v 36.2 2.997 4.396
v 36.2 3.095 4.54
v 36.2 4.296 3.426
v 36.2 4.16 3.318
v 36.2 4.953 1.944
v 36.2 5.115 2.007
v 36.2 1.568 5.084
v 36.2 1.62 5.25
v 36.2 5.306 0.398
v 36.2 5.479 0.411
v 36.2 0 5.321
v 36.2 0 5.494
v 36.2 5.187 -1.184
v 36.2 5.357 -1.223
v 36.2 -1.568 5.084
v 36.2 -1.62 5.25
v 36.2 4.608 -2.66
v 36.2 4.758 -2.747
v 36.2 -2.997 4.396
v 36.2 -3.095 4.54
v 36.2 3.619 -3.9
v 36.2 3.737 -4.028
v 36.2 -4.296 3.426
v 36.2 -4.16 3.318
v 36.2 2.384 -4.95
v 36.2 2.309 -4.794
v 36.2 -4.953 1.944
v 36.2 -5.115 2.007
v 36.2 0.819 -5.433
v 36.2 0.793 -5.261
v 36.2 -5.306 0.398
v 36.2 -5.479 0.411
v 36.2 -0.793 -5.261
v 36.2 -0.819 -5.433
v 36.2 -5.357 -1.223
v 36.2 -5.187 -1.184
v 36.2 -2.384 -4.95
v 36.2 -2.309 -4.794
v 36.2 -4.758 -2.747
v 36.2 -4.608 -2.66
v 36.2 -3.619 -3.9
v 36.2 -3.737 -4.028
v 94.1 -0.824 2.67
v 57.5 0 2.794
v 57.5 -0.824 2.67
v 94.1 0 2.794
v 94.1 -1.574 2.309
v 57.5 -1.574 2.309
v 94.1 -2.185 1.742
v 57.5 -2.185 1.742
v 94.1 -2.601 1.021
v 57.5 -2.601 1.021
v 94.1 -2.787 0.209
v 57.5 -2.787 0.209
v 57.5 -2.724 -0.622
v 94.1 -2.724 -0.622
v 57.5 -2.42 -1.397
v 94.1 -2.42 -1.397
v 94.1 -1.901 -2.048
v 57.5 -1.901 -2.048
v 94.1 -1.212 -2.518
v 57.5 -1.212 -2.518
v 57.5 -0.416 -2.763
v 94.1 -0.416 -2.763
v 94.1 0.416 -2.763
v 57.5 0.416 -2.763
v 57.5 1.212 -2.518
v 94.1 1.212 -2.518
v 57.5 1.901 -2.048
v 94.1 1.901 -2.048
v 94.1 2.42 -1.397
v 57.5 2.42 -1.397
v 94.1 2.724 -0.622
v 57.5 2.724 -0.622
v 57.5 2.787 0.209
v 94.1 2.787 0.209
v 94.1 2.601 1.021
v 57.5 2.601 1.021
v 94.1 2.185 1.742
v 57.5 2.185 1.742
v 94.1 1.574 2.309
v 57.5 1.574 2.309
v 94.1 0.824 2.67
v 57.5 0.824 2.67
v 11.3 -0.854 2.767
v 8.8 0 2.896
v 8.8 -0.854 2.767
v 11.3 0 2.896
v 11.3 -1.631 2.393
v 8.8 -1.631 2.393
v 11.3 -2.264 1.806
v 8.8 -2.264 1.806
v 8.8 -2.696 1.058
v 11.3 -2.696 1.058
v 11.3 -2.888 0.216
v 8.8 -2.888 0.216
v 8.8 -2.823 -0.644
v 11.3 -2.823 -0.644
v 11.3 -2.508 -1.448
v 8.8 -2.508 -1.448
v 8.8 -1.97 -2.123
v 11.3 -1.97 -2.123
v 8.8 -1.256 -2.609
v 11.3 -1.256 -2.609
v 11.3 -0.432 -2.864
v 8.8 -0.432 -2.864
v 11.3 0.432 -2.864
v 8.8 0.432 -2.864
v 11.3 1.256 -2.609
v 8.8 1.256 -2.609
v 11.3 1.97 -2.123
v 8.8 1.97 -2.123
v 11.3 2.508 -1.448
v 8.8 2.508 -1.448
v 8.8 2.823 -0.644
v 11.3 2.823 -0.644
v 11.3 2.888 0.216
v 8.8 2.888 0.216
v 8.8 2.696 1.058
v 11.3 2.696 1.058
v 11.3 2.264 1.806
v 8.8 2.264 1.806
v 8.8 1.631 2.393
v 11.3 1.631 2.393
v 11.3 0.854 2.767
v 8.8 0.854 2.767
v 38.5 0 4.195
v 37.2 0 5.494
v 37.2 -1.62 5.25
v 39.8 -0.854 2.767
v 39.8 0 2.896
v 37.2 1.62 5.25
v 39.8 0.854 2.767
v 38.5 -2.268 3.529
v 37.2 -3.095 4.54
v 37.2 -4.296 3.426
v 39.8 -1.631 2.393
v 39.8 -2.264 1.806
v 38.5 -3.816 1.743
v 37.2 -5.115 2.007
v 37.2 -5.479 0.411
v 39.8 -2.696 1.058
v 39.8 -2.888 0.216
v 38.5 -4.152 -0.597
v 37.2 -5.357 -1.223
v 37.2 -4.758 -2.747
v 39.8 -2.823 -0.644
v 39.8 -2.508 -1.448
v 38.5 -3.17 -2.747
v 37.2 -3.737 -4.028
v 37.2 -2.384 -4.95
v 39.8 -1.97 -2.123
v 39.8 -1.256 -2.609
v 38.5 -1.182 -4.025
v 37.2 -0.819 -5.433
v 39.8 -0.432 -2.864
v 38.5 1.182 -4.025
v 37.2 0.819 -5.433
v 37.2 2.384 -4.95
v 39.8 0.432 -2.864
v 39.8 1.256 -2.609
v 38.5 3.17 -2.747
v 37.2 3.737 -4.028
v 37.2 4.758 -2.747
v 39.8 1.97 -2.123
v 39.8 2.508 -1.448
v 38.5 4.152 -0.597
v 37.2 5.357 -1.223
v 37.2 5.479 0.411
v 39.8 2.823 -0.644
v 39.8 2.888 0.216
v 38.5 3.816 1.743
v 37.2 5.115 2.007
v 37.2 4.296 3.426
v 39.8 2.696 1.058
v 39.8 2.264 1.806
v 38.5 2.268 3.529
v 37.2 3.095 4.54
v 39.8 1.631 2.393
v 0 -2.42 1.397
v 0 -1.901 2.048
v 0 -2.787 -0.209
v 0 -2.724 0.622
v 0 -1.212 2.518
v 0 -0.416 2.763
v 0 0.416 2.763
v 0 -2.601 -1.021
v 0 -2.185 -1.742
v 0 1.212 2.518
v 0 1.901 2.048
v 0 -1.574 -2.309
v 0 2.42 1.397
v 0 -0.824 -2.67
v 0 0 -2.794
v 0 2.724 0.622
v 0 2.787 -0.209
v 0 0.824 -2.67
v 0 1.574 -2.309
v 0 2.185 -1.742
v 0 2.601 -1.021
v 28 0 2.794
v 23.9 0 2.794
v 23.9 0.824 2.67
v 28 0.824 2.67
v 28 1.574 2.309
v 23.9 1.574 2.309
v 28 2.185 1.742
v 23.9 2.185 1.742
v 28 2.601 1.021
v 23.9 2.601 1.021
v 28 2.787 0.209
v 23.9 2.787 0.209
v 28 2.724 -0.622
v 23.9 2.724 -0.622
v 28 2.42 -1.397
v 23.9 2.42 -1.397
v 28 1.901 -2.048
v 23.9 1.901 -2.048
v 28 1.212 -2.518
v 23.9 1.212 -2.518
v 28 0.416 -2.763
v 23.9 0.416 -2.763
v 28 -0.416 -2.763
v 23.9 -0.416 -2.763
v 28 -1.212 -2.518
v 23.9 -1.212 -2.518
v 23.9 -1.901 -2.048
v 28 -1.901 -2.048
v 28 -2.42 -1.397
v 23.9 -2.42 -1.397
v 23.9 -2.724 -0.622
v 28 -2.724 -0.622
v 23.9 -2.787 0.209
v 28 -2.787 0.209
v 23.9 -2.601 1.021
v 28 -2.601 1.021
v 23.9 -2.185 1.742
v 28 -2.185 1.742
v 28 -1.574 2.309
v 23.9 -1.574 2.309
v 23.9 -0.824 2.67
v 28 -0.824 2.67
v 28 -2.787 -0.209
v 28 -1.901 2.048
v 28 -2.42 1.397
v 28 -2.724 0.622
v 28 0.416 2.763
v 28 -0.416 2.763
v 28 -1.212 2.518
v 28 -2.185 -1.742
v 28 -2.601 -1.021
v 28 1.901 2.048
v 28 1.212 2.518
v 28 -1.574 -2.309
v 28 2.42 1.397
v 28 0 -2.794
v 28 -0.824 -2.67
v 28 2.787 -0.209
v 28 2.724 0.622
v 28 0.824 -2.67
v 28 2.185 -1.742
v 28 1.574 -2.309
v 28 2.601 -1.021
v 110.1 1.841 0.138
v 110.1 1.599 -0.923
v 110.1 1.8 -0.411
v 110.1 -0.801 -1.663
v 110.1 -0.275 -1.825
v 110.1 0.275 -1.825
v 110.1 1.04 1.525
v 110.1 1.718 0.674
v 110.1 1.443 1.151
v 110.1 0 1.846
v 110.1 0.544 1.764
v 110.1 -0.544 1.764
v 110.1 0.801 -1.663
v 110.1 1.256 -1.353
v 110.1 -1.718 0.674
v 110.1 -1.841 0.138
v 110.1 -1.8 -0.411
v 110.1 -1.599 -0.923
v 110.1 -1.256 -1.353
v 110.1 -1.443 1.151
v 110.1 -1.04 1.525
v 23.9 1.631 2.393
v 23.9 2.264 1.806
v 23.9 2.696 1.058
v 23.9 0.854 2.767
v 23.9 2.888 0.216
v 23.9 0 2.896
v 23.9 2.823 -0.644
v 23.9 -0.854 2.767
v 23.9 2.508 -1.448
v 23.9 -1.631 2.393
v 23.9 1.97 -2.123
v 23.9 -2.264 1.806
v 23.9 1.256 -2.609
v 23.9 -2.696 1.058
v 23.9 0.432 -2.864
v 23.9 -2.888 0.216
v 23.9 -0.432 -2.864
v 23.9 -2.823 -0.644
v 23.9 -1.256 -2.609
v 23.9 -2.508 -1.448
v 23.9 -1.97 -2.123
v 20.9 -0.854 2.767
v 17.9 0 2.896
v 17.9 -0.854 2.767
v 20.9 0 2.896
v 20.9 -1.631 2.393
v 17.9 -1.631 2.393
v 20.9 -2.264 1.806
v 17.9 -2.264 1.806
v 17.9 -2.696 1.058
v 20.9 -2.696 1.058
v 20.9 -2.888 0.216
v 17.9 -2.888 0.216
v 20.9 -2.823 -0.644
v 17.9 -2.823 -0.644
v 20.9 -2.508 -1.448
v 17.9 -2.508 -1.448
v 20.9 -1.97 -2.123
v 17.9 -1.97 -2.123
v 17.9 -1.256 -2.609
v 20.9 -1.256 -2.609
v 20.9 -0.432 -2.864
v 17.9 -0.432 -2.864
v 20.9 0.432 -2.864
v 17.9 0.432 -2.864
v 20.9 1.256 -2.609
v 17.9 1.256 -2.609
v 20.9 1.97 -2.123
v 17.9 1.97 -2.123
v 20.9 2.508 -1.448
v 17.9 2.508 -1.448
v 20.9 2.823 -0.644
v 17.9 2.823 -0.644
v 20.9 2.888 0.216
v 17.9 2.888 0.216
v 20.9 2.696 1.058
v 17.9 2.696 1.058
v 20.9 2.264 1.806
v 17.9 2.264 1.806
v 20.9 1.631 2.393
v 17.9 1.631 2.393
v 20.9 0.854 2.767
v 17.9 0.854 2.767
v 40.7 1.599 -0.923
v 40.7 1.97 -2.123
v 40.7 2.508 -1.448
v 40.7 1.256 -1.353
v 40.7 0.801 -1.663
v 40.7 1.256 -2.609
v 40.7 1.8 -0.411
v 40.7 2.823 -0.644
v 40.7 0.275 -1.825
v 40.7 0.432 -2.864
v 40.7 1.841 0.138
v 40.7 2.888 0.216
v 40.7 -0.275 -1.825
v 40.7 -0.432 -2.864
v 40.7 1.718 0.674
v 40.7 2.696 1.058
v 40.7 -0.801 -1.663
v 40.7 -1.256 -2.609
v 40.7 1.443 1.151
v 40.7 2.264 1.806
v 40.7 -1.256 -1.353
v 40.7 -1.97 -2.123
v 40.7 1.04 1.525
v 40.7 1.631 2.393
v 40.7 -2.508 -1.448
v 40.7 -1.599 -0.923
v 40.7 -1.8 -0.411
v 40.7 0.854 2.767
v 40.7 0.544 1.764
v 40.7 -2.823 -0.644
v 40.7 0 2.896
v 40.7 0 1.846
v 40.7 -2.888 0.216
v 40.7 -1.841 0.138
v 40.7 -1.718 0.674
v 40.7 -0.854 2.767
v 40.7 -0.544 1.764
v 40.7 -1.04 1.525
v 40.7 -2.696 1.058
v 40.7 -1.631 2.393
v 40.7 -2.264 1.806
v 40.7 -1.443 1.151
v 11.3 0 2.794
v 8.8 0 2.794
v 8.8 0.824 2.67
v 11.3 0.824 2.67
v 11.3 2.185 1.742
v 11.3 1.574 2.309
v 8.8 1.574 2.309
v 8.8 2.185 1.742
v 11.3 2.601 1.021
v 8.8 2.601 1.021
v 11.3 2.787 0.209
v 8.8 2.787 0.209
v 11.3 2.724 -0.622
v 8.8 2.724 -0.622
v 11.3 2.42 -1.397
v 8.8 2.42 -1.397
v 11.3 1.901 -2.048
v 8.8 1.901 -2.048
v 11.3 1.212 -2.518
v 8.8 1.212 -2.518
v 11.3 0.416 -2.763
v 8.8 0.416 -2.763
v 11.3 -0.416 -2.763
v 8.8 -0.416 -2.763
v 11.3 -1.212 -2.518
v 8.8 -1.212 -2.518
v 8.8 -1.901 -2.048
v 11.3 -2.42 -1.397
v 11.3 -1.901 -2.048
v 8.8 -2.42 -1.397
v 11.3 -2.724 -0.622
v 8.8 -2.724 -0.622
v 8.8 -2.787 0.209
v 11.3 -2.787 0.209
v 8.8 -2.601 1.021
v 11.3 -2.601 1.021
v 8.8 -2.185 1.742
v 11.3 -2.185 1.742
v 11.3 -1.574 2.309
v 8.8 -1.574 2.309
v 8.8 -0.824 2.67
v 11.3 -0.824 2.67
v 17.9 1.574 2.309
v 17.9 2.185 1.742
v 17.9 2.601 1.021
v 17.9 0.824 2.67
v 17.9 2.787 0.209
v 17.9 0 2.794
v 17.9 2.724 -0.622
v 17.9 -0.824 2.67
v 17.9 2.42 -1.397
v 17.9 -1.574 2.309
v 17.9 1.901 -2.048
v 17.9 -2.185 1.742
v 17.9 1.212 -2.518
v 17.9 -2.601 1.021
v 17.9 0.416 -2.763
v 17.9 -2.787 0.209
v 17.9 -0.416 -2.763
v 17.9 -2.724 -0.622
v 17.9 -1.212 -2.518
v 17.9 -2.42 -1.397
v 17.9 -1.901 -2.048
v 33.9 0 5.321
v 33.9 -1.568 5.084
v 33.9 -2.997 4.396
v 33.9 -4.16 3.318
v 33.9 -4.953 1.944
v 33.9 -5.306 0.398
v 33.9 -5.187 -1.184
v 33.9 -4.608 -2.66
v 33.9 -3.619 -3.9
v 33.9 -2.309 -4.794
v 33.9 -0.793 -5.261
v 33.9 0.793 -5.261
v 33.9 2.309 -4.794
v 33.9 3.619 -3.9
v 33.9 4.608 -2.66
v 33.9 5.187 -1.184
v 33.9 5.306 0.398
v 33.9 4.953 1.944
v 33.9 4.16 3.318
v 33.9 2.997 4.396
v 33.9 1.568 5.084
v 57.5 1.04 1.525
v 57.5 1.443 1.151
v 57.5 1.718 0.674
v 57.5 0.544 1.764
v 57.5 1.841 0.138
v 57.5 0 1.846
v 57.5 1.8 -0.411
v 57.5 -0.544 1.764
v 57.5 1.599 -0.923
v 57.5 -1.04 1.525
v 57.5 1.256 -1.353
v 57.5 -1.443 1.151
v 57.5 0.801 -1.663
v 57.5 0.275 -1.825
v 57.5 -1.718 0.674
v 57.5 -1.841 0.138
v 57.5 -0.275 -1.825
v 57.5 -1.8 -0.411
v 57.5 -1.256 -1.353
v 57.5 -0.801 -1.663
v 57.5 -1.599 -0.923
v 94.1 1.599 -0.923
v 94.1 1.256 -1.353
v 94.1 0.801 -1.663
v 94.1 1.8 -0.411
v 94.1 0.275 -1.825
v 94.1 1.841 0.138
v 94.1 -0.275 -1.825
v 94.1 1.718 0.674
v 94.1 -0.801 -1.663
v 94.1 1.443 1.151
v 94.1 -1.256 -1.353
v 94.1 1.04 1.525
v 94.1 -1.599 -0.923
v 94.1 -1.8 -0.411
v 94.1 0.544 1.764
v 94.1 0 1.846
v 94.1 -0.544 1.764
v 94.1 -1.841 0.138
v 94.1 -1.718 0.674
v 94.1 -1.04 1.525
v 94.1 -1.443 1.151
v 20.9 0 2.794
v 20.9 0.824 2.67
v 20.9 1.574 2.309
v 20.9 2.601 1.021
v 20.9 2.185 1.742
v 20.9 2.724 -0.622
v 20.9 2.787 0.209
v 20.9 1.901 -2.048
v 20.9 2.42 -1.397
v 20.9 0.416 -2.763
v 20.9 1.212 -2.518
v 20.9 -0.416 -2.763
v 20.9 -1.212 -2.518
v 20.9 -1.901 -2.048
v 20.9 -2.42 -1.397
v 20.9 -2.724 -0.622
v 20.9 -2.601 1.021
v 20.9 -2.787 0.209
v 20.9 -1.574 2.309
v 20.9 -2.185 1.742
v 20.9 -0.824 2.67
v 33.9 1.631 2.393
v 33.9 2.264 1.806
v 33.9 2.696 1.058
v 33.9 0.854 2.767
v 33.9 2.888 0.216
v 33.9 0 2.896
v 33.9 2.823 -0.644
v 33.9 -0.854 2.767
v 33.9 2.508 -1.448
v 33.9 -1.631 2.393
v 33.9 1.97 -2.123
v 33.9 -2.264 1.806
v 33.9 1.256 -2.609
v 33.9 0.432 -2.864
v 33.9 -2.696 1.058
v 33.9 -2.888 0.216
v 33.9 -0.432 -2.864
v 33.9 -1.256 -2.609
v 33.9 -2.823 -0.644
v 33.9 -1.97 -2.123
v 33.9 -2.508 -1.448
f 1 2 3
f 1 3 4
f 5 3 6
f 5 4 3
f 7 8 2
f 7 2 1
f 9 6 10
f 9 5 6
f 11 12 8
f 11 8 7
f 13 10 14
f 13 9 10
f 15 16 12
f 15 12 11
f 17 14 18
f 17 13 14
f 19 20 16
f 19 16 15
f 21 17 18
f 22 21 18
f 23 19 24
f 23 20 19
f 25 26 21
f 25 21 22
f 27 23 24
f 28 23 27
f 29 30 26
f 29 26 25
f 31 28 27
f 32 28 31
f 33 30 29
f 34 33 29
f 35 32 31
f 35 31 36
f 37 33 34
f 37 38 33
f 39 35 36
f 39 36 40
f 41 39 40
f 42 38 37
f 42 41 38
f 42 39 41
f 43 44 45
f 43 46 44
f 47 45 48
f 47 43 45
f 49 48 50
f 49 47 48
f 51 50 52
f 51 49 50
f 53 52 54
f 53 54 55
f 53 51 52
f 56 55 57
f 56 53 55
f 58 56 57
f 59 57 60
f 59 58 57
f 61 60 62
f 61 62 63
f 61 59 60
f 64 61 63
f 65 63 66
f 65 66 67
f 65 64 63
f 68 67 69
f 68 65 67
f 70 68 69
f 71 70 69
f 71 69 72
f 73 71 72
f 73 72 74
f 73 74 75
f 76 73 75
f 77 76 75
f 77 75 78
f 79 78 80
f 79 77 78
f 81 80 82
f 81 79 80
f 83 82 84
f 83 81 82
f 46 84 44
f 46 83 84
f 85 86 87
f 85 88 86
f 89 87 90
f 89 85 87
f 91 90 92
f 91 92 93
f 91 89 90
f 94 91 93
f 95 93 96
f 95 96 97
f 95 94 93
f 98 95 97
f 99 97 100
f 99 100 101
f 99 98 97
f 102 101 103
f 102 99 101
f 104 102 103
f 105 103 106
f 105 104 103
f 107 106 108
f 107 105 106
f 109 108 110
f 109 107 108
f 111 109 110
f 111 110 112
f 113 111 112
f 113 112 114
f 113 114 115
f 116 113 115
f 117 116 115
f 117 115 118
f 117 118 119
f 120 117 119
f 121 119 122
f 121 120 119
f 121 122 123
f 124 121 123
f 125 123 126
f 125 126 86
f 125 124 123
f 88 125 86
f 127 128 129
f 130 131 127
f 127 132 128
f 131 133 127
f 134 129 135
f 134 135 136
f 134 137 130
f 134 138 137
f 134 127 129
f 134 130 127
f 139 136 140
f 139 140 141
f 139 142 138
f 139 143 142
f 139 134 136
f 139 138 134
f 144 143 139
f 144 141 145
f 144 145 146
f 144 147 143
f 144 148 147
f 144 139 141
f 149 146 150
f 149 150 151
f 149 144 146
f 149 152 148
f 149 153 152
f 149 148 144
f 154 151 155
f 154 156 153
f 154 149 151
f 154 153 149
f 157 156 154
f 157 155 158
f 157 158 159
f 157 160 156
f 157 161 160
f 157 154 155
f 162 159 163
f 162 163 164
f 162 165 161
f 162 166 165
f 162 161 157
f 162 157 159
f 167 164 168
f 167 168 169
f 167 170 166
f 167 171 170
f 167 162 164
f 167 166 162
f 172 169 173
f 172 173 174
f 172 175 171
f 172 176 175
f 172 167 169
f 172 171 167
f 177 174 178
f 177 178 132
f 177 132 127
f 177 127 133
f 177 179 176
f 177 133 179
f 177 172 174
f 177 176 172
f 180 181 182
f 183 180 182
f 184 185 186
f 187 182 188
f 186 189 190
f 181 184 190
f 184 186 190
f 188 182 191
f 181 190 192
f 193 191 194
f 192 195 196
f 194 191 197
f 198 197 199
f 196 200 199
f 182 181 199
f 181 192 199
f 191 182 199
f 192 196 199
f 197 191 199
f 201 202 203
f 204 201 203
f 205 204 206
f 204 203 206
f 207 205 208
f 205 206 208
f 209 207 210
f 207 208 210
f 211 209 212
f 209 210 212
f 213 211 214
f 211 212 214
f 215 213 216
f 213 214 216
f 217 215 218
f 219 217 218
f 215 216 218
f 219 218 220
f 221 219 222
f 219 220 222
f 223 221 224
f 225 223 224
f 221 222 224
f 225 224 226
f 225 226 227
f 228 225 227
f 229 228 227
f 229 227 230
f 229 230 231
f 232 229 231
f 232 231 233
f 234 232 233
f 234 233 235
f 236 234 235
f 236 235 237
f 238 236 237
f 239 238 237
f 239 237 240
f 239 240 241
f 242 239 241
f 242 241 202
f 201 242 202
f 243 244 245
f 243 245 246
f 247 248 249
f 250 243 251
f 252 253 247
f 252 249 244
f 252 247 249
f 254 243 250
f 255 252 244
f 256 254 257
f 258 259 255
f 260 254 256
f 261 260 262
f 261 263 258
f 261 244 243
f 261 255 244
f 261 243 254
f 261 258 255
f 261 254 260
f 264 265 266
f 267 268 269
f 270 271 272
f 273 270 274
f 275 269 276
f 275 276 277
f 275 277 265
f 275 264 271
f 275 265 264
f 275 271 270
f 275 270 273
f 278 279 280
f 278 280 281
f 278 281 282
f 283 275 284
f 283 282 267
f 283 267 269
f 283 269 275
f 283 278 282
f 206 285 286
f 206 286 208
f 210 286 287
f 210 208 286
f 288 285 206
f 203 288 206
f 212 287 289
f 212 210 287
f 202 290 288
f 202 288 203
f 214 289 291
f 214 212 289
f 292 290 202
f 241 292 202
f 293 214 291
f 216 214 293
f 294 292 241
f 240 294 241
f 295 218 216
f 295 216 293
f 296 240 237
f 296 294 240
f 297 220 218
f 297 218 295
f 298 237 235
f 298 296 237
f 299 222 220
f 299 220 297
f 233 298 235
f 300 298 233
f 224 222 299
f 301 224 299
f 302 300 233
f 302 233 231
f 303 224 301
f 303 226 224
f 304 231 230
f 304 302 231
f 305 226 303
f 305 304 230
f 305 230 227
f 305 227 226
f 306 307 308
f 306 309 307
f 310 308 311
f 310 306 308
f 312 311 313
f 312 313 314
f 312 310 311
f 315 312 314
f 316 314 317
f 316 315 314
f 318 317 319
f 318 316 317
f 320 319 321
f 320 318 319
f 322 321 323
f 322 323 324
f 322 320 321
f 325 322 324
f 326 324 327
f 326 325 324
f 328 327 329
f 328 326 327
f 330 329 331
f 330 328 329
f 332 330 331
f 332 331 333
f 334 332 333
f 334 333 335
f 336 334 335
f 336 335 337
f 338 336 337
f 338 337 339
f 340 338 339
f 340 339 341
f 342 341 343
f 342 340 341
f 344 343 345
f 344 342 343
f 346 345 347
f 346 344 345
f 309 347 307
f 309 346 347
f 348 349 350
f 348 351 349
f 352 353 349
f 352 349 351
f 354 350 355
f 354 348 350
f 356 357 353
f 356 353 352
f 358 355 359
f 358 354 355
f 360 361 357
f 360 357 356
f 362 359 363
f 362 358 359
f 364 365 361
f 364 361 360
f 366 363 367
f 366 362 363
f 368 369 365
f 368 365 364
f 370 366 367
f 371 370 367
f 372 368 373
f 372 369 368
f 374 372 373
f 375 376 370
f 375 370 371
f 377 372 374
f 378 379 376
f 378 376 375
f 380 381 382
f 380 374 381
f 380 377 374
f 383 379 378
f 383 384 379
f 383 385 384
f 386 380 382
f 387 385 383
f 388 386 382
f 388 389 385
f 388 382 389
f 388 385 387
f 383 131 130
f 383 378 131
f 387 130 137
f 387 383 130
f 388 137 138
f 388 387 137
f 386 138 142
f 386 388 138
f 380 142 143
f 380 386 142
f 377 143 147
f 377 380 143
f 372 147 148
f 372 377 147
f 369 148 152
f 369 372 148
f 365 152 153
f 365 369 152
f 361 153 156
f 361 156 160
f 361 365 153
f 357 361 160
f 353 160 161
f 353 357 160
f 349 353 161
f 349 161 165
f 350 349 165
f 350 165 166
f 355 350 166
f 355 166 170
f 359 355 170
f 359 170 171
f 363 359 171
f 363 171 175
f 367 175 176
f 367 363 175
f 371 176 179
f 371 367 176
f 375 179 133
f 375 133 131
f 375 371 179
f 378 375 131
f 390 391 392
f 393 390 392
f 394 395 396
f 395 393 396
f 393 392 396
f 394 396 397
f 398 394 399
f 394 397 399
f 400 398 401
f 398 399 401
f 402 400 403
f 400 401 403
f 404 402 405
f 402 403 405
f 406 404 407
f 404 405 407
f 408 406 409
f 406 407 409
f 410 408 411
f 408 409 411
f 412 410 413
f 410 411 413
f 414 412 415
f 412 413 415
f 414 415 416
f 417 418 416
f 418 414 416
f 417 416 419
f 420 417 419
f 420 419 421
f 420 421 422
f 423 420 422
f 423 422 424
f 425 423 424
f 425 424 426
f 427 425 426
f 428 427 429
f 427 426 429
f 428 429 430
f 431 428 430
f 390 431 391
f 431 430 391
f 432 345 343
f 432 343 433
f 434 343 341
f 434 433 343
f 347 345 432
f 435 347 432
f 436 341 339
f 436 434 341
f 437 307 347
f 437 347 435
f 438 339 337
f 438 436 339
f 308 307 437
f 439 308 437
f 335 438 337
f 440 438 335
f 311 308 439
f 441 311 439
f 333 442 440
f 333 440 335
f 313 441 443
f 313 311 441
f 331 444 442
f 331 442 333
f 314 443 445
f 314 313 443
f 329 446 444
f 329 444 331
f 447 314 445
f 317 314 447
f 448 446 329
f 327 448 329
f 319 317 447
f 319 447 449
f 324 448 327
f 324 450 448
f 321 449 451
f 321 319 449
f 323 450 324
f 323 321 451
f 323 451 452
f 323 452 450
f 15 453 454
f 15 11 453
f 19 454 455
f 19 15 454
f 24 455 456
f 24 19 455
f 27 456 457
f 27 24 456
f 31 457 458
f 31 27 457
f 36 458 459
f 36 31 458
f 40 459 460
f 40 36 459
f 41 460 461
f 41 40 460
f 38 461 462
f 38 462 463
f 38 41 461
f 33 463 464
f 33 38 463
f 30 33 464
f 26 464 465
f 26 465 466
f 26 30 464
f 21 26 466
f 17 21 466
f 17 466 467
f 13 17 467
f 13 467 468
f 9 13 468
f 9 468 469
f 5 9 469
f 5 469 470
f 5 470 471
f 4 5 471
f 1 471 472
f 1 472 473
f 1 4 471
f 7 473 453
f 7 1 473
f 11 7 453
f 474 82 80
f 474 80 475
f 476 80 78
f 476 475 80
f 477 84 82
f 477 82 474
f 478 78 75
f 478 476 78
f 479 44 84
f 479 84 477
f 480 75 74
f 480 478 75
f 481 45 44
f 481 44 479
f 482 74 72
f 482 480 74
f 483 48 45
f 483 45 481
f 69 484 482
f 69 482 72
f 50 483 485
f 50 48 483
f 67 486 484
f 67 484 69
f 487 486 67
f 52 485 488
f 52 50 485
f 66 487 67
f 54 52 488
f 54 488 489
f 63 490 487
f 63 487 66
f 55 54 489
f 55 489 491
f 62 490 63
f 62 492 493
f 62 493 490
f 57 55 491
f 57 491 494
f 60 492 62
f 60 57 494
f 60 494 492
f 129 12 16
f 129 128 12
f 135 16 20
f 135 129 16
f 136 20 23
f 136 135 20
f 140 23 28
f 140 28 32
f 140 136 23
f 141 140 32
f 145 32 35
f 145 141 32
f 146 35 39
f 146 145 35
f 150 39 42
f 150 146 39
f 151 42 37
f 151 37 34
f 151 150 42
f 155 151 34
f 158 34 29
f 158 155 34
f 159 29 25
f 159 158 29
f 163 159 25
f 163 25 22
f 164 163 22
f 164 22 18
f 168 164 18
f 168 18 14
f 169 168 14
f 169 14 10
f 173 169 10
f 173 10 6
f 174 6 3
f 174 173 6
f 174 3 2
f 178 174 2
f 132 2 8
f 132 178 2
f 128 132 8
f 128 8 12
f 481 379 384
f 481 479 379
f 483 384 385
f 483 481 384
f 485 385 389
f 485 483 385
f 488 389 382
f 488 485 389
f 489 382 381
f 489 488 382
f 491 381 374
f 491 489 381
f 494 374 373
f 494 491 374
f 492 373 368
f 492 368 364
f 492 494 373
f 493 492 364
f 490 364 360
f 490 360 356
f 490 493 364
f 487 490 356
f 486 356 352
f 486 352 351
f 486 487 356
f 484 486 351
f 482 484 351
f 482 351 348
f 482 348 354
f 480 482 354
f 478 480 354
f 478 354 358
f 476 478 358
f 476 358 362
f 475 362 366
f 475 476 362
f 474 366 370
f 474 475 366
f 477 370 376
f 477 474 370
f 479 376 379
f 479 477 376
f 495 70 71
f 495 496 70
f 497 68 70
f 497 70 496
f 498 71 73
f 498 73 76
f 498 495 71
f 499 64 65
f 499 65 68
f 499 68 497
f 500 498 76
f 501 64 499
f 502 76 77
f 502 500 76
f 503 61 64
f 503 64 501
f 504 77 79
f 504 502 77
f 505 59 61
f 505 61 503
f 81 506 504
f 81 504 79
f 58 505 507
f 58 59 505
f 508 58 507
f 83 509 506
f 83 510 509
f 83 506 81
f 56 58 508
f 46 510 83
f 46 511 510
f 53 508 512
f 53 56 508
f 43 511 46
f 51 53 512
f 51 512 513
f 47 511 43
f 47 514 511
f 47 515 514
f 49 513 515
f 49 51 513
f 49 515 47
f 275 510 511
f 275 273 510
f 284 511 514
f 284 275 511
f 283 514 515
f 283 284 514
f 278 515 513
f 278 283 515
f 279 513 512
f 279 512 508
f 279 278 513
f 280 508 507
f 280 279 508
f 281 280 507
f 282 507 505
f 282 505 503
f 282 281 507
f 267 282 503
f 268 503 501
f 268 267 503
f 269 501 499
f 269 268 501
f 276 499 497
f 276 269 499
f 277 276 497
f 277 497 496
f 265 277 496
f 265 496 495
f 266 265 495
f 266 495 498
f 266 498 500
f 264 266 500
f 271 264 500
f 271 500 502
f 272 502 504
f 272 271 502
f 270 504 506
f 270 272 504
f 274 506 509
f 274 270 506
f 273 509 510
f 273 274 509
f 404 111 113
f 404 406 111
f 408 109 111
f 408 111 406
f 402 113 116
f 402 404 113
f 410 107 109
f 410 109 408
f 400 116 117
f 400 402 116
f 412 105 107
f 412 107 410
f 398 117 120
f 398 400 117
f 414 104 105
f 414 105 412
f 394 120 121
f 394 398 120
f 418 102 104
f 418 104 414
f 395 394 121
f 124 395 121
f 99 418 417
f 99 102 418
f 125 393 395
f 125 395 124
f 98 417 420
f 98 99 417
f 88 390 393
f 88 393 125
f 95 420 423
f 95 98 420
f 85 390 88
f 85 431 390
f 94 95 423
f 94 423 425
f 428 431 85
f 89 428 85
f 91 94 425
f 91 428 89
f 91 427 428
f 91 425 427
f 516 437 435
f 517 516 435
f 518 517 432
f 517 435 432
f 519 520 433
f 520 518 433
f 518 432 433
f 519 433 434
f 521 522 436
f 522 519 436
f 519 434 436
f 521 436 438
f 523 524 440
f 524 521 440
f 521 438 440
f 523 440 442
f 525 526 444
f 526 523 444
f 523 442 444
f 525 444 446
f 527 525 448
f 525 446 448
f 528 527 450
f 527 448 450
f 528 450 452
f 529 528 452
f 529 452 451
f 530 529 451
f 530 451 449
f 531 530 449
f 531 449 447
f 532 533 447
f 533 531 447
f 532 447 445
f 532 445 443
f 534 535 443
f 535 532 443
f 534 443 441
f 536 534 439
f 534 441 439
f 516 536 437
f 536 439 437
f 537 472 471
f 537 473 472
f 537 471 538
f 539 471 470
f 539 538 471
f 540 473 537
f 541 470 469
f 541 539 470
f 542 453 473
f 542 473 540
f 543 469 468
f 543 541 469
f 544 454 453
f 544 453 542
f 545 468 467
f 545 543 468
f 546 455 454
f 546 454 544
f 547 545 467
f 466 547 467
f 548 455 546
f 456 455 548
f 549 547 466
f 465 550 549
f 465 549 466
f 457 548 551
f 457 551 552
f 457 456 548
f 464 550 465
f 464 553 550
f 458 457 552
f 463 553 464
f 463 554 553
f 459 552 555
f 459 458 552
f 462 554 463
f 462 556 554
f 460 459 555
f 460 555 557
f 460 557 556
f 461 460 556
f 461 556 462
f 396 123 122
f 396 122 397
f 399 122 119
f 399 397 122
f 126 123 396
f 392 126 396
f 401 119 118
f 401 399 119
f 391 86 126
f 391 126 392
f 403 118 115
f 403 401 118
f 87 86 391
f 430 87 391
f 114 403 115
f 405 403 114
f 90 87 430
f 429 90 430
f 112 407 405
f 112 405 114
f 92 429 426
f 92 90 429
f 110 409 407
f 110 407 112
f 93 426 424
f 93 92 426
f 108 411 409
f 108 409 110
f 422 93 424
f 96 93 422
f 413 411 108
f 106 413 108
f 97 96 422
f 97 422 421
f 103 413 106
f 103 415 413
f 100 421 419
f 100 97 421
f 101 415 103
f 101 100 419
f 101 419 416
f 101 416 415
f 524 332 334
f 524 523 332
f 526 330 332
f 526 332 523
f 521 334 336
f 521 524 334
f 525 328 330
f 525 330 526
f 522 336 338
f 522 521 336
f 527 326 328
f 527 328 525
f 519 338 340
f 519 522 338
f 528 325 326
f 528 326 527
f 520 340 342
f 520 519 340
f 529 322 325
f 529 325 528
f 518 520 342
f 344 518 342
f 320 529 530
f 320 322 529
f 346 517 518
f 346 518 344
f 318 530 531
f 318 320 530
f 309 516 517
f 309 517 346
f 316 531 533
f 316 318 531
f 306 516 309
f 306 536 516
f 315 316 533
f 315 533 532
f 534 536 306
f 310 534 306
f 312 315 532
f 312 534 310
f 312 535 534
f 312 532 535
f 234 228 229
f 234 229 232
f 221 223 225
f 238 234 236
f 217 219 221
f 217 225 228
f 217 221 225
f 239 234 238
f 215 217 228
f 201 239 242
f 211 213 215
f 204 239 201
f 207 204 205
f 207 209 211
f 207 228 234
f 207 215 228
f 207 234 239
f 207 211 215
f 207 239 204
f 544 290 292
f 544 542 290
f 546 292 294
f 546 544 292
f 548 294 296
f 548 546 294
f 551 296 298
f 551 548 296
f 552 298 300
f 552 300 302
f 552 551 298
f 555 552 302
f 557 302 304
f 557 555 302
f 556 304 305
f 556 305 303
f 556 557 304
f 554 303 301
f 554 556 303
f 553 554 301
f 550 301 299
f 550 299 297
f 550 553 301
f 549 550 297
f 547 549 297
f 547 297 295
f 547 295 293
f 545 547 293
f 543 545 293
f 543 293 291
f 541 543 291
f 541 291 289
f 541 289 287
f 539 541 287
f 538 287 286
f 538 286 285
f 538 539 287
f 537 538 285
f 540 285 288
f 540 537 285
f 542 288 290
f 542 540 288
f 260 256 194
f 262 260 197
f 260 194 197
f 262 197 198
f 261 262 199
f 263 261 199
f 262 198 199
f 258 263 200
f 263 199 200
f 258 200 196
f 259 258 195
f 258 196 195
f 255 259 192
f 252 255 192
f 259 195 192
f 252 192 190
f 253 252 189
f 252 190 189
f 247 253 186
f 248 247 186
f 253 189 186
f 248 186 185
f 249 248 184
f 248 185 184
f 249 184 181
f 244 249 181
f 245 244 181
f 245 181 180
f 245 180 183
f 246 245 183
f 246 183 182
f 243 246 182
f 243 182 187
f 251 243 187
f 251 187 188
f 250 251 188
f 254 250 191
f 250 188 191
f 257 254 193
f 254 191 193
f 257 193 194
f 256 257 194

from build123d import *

# Parameters (mm, degrees)
SKETCH2_R           = 2.794474829
CUT_EXTRUDE1_DEPTH  = 28
SKETCH3_R           = 2.794474829
BOSS_EXTRUDE1_DEPTH = 28


with BuildPart() as part:
    # Sketch1 → Revolve1 (revolve)
    with BuildSketch(Plane(origin=(0, 0, 0), x_dir=(1, 0, 0), z_dir=(0, 1, 0))):
        Polygon((23.900000378, -2.895873106), (33.900000155, -2.895873106), (33.900000155, -5.320860504), (36.200001836, -5.320860504), (36.200001836, -5.494461861), (37.200000137, -5.494461861), (39.799999446, -2.895873106), (40.699999779, -2.895873106), (40.699999779, -1.845926362), (57.500001043, -1.845926362), (57.500001043, -2.794474829), (94.099998474, -2.794474829), (94.099998474, -1.845926362), (110.100001097, -1.845926362), (110.100001097, 0), (0, 0), (0, -2.794474829), (8.799999952, -2.794474829), (8.799999952, -2.895873106), (11.300000362, -2.895873106), (11.300000362, -2.794474829), (17.899999395, -2.794474829), (17.899999395, -2.895873106), (20.899999887, -2.895873106), (20.899999887, -2.794474829), (23.900000378, -2.794474829), align=None)
    revolve(axis=Axis((0, 0, 0), (1, 0, 0)))

    # Sketch2 → Cut-Extrude1 (cut)
    with BuildSketch(Plane.ZY):
        Circle(SKETCH2_R)
    extrude(amount=-CUT_EXTRUDE1_DEPTH, mode=Mode.SUBTRACT)


with BuildPart() as body_2:
    # Sketch3 → Boss-Extrude1 (new body)
    with BuildSketch(Plane(origin=(0, 0, 0), x_dir=(0, 0, -1), z_dir=(1, 0, 0))):
        Circle(SKETCH3_R)
    extrude(amount=BOSS_EXTRUDE1_DEPTH)


solid = Compound([part.part, body_2.part])
